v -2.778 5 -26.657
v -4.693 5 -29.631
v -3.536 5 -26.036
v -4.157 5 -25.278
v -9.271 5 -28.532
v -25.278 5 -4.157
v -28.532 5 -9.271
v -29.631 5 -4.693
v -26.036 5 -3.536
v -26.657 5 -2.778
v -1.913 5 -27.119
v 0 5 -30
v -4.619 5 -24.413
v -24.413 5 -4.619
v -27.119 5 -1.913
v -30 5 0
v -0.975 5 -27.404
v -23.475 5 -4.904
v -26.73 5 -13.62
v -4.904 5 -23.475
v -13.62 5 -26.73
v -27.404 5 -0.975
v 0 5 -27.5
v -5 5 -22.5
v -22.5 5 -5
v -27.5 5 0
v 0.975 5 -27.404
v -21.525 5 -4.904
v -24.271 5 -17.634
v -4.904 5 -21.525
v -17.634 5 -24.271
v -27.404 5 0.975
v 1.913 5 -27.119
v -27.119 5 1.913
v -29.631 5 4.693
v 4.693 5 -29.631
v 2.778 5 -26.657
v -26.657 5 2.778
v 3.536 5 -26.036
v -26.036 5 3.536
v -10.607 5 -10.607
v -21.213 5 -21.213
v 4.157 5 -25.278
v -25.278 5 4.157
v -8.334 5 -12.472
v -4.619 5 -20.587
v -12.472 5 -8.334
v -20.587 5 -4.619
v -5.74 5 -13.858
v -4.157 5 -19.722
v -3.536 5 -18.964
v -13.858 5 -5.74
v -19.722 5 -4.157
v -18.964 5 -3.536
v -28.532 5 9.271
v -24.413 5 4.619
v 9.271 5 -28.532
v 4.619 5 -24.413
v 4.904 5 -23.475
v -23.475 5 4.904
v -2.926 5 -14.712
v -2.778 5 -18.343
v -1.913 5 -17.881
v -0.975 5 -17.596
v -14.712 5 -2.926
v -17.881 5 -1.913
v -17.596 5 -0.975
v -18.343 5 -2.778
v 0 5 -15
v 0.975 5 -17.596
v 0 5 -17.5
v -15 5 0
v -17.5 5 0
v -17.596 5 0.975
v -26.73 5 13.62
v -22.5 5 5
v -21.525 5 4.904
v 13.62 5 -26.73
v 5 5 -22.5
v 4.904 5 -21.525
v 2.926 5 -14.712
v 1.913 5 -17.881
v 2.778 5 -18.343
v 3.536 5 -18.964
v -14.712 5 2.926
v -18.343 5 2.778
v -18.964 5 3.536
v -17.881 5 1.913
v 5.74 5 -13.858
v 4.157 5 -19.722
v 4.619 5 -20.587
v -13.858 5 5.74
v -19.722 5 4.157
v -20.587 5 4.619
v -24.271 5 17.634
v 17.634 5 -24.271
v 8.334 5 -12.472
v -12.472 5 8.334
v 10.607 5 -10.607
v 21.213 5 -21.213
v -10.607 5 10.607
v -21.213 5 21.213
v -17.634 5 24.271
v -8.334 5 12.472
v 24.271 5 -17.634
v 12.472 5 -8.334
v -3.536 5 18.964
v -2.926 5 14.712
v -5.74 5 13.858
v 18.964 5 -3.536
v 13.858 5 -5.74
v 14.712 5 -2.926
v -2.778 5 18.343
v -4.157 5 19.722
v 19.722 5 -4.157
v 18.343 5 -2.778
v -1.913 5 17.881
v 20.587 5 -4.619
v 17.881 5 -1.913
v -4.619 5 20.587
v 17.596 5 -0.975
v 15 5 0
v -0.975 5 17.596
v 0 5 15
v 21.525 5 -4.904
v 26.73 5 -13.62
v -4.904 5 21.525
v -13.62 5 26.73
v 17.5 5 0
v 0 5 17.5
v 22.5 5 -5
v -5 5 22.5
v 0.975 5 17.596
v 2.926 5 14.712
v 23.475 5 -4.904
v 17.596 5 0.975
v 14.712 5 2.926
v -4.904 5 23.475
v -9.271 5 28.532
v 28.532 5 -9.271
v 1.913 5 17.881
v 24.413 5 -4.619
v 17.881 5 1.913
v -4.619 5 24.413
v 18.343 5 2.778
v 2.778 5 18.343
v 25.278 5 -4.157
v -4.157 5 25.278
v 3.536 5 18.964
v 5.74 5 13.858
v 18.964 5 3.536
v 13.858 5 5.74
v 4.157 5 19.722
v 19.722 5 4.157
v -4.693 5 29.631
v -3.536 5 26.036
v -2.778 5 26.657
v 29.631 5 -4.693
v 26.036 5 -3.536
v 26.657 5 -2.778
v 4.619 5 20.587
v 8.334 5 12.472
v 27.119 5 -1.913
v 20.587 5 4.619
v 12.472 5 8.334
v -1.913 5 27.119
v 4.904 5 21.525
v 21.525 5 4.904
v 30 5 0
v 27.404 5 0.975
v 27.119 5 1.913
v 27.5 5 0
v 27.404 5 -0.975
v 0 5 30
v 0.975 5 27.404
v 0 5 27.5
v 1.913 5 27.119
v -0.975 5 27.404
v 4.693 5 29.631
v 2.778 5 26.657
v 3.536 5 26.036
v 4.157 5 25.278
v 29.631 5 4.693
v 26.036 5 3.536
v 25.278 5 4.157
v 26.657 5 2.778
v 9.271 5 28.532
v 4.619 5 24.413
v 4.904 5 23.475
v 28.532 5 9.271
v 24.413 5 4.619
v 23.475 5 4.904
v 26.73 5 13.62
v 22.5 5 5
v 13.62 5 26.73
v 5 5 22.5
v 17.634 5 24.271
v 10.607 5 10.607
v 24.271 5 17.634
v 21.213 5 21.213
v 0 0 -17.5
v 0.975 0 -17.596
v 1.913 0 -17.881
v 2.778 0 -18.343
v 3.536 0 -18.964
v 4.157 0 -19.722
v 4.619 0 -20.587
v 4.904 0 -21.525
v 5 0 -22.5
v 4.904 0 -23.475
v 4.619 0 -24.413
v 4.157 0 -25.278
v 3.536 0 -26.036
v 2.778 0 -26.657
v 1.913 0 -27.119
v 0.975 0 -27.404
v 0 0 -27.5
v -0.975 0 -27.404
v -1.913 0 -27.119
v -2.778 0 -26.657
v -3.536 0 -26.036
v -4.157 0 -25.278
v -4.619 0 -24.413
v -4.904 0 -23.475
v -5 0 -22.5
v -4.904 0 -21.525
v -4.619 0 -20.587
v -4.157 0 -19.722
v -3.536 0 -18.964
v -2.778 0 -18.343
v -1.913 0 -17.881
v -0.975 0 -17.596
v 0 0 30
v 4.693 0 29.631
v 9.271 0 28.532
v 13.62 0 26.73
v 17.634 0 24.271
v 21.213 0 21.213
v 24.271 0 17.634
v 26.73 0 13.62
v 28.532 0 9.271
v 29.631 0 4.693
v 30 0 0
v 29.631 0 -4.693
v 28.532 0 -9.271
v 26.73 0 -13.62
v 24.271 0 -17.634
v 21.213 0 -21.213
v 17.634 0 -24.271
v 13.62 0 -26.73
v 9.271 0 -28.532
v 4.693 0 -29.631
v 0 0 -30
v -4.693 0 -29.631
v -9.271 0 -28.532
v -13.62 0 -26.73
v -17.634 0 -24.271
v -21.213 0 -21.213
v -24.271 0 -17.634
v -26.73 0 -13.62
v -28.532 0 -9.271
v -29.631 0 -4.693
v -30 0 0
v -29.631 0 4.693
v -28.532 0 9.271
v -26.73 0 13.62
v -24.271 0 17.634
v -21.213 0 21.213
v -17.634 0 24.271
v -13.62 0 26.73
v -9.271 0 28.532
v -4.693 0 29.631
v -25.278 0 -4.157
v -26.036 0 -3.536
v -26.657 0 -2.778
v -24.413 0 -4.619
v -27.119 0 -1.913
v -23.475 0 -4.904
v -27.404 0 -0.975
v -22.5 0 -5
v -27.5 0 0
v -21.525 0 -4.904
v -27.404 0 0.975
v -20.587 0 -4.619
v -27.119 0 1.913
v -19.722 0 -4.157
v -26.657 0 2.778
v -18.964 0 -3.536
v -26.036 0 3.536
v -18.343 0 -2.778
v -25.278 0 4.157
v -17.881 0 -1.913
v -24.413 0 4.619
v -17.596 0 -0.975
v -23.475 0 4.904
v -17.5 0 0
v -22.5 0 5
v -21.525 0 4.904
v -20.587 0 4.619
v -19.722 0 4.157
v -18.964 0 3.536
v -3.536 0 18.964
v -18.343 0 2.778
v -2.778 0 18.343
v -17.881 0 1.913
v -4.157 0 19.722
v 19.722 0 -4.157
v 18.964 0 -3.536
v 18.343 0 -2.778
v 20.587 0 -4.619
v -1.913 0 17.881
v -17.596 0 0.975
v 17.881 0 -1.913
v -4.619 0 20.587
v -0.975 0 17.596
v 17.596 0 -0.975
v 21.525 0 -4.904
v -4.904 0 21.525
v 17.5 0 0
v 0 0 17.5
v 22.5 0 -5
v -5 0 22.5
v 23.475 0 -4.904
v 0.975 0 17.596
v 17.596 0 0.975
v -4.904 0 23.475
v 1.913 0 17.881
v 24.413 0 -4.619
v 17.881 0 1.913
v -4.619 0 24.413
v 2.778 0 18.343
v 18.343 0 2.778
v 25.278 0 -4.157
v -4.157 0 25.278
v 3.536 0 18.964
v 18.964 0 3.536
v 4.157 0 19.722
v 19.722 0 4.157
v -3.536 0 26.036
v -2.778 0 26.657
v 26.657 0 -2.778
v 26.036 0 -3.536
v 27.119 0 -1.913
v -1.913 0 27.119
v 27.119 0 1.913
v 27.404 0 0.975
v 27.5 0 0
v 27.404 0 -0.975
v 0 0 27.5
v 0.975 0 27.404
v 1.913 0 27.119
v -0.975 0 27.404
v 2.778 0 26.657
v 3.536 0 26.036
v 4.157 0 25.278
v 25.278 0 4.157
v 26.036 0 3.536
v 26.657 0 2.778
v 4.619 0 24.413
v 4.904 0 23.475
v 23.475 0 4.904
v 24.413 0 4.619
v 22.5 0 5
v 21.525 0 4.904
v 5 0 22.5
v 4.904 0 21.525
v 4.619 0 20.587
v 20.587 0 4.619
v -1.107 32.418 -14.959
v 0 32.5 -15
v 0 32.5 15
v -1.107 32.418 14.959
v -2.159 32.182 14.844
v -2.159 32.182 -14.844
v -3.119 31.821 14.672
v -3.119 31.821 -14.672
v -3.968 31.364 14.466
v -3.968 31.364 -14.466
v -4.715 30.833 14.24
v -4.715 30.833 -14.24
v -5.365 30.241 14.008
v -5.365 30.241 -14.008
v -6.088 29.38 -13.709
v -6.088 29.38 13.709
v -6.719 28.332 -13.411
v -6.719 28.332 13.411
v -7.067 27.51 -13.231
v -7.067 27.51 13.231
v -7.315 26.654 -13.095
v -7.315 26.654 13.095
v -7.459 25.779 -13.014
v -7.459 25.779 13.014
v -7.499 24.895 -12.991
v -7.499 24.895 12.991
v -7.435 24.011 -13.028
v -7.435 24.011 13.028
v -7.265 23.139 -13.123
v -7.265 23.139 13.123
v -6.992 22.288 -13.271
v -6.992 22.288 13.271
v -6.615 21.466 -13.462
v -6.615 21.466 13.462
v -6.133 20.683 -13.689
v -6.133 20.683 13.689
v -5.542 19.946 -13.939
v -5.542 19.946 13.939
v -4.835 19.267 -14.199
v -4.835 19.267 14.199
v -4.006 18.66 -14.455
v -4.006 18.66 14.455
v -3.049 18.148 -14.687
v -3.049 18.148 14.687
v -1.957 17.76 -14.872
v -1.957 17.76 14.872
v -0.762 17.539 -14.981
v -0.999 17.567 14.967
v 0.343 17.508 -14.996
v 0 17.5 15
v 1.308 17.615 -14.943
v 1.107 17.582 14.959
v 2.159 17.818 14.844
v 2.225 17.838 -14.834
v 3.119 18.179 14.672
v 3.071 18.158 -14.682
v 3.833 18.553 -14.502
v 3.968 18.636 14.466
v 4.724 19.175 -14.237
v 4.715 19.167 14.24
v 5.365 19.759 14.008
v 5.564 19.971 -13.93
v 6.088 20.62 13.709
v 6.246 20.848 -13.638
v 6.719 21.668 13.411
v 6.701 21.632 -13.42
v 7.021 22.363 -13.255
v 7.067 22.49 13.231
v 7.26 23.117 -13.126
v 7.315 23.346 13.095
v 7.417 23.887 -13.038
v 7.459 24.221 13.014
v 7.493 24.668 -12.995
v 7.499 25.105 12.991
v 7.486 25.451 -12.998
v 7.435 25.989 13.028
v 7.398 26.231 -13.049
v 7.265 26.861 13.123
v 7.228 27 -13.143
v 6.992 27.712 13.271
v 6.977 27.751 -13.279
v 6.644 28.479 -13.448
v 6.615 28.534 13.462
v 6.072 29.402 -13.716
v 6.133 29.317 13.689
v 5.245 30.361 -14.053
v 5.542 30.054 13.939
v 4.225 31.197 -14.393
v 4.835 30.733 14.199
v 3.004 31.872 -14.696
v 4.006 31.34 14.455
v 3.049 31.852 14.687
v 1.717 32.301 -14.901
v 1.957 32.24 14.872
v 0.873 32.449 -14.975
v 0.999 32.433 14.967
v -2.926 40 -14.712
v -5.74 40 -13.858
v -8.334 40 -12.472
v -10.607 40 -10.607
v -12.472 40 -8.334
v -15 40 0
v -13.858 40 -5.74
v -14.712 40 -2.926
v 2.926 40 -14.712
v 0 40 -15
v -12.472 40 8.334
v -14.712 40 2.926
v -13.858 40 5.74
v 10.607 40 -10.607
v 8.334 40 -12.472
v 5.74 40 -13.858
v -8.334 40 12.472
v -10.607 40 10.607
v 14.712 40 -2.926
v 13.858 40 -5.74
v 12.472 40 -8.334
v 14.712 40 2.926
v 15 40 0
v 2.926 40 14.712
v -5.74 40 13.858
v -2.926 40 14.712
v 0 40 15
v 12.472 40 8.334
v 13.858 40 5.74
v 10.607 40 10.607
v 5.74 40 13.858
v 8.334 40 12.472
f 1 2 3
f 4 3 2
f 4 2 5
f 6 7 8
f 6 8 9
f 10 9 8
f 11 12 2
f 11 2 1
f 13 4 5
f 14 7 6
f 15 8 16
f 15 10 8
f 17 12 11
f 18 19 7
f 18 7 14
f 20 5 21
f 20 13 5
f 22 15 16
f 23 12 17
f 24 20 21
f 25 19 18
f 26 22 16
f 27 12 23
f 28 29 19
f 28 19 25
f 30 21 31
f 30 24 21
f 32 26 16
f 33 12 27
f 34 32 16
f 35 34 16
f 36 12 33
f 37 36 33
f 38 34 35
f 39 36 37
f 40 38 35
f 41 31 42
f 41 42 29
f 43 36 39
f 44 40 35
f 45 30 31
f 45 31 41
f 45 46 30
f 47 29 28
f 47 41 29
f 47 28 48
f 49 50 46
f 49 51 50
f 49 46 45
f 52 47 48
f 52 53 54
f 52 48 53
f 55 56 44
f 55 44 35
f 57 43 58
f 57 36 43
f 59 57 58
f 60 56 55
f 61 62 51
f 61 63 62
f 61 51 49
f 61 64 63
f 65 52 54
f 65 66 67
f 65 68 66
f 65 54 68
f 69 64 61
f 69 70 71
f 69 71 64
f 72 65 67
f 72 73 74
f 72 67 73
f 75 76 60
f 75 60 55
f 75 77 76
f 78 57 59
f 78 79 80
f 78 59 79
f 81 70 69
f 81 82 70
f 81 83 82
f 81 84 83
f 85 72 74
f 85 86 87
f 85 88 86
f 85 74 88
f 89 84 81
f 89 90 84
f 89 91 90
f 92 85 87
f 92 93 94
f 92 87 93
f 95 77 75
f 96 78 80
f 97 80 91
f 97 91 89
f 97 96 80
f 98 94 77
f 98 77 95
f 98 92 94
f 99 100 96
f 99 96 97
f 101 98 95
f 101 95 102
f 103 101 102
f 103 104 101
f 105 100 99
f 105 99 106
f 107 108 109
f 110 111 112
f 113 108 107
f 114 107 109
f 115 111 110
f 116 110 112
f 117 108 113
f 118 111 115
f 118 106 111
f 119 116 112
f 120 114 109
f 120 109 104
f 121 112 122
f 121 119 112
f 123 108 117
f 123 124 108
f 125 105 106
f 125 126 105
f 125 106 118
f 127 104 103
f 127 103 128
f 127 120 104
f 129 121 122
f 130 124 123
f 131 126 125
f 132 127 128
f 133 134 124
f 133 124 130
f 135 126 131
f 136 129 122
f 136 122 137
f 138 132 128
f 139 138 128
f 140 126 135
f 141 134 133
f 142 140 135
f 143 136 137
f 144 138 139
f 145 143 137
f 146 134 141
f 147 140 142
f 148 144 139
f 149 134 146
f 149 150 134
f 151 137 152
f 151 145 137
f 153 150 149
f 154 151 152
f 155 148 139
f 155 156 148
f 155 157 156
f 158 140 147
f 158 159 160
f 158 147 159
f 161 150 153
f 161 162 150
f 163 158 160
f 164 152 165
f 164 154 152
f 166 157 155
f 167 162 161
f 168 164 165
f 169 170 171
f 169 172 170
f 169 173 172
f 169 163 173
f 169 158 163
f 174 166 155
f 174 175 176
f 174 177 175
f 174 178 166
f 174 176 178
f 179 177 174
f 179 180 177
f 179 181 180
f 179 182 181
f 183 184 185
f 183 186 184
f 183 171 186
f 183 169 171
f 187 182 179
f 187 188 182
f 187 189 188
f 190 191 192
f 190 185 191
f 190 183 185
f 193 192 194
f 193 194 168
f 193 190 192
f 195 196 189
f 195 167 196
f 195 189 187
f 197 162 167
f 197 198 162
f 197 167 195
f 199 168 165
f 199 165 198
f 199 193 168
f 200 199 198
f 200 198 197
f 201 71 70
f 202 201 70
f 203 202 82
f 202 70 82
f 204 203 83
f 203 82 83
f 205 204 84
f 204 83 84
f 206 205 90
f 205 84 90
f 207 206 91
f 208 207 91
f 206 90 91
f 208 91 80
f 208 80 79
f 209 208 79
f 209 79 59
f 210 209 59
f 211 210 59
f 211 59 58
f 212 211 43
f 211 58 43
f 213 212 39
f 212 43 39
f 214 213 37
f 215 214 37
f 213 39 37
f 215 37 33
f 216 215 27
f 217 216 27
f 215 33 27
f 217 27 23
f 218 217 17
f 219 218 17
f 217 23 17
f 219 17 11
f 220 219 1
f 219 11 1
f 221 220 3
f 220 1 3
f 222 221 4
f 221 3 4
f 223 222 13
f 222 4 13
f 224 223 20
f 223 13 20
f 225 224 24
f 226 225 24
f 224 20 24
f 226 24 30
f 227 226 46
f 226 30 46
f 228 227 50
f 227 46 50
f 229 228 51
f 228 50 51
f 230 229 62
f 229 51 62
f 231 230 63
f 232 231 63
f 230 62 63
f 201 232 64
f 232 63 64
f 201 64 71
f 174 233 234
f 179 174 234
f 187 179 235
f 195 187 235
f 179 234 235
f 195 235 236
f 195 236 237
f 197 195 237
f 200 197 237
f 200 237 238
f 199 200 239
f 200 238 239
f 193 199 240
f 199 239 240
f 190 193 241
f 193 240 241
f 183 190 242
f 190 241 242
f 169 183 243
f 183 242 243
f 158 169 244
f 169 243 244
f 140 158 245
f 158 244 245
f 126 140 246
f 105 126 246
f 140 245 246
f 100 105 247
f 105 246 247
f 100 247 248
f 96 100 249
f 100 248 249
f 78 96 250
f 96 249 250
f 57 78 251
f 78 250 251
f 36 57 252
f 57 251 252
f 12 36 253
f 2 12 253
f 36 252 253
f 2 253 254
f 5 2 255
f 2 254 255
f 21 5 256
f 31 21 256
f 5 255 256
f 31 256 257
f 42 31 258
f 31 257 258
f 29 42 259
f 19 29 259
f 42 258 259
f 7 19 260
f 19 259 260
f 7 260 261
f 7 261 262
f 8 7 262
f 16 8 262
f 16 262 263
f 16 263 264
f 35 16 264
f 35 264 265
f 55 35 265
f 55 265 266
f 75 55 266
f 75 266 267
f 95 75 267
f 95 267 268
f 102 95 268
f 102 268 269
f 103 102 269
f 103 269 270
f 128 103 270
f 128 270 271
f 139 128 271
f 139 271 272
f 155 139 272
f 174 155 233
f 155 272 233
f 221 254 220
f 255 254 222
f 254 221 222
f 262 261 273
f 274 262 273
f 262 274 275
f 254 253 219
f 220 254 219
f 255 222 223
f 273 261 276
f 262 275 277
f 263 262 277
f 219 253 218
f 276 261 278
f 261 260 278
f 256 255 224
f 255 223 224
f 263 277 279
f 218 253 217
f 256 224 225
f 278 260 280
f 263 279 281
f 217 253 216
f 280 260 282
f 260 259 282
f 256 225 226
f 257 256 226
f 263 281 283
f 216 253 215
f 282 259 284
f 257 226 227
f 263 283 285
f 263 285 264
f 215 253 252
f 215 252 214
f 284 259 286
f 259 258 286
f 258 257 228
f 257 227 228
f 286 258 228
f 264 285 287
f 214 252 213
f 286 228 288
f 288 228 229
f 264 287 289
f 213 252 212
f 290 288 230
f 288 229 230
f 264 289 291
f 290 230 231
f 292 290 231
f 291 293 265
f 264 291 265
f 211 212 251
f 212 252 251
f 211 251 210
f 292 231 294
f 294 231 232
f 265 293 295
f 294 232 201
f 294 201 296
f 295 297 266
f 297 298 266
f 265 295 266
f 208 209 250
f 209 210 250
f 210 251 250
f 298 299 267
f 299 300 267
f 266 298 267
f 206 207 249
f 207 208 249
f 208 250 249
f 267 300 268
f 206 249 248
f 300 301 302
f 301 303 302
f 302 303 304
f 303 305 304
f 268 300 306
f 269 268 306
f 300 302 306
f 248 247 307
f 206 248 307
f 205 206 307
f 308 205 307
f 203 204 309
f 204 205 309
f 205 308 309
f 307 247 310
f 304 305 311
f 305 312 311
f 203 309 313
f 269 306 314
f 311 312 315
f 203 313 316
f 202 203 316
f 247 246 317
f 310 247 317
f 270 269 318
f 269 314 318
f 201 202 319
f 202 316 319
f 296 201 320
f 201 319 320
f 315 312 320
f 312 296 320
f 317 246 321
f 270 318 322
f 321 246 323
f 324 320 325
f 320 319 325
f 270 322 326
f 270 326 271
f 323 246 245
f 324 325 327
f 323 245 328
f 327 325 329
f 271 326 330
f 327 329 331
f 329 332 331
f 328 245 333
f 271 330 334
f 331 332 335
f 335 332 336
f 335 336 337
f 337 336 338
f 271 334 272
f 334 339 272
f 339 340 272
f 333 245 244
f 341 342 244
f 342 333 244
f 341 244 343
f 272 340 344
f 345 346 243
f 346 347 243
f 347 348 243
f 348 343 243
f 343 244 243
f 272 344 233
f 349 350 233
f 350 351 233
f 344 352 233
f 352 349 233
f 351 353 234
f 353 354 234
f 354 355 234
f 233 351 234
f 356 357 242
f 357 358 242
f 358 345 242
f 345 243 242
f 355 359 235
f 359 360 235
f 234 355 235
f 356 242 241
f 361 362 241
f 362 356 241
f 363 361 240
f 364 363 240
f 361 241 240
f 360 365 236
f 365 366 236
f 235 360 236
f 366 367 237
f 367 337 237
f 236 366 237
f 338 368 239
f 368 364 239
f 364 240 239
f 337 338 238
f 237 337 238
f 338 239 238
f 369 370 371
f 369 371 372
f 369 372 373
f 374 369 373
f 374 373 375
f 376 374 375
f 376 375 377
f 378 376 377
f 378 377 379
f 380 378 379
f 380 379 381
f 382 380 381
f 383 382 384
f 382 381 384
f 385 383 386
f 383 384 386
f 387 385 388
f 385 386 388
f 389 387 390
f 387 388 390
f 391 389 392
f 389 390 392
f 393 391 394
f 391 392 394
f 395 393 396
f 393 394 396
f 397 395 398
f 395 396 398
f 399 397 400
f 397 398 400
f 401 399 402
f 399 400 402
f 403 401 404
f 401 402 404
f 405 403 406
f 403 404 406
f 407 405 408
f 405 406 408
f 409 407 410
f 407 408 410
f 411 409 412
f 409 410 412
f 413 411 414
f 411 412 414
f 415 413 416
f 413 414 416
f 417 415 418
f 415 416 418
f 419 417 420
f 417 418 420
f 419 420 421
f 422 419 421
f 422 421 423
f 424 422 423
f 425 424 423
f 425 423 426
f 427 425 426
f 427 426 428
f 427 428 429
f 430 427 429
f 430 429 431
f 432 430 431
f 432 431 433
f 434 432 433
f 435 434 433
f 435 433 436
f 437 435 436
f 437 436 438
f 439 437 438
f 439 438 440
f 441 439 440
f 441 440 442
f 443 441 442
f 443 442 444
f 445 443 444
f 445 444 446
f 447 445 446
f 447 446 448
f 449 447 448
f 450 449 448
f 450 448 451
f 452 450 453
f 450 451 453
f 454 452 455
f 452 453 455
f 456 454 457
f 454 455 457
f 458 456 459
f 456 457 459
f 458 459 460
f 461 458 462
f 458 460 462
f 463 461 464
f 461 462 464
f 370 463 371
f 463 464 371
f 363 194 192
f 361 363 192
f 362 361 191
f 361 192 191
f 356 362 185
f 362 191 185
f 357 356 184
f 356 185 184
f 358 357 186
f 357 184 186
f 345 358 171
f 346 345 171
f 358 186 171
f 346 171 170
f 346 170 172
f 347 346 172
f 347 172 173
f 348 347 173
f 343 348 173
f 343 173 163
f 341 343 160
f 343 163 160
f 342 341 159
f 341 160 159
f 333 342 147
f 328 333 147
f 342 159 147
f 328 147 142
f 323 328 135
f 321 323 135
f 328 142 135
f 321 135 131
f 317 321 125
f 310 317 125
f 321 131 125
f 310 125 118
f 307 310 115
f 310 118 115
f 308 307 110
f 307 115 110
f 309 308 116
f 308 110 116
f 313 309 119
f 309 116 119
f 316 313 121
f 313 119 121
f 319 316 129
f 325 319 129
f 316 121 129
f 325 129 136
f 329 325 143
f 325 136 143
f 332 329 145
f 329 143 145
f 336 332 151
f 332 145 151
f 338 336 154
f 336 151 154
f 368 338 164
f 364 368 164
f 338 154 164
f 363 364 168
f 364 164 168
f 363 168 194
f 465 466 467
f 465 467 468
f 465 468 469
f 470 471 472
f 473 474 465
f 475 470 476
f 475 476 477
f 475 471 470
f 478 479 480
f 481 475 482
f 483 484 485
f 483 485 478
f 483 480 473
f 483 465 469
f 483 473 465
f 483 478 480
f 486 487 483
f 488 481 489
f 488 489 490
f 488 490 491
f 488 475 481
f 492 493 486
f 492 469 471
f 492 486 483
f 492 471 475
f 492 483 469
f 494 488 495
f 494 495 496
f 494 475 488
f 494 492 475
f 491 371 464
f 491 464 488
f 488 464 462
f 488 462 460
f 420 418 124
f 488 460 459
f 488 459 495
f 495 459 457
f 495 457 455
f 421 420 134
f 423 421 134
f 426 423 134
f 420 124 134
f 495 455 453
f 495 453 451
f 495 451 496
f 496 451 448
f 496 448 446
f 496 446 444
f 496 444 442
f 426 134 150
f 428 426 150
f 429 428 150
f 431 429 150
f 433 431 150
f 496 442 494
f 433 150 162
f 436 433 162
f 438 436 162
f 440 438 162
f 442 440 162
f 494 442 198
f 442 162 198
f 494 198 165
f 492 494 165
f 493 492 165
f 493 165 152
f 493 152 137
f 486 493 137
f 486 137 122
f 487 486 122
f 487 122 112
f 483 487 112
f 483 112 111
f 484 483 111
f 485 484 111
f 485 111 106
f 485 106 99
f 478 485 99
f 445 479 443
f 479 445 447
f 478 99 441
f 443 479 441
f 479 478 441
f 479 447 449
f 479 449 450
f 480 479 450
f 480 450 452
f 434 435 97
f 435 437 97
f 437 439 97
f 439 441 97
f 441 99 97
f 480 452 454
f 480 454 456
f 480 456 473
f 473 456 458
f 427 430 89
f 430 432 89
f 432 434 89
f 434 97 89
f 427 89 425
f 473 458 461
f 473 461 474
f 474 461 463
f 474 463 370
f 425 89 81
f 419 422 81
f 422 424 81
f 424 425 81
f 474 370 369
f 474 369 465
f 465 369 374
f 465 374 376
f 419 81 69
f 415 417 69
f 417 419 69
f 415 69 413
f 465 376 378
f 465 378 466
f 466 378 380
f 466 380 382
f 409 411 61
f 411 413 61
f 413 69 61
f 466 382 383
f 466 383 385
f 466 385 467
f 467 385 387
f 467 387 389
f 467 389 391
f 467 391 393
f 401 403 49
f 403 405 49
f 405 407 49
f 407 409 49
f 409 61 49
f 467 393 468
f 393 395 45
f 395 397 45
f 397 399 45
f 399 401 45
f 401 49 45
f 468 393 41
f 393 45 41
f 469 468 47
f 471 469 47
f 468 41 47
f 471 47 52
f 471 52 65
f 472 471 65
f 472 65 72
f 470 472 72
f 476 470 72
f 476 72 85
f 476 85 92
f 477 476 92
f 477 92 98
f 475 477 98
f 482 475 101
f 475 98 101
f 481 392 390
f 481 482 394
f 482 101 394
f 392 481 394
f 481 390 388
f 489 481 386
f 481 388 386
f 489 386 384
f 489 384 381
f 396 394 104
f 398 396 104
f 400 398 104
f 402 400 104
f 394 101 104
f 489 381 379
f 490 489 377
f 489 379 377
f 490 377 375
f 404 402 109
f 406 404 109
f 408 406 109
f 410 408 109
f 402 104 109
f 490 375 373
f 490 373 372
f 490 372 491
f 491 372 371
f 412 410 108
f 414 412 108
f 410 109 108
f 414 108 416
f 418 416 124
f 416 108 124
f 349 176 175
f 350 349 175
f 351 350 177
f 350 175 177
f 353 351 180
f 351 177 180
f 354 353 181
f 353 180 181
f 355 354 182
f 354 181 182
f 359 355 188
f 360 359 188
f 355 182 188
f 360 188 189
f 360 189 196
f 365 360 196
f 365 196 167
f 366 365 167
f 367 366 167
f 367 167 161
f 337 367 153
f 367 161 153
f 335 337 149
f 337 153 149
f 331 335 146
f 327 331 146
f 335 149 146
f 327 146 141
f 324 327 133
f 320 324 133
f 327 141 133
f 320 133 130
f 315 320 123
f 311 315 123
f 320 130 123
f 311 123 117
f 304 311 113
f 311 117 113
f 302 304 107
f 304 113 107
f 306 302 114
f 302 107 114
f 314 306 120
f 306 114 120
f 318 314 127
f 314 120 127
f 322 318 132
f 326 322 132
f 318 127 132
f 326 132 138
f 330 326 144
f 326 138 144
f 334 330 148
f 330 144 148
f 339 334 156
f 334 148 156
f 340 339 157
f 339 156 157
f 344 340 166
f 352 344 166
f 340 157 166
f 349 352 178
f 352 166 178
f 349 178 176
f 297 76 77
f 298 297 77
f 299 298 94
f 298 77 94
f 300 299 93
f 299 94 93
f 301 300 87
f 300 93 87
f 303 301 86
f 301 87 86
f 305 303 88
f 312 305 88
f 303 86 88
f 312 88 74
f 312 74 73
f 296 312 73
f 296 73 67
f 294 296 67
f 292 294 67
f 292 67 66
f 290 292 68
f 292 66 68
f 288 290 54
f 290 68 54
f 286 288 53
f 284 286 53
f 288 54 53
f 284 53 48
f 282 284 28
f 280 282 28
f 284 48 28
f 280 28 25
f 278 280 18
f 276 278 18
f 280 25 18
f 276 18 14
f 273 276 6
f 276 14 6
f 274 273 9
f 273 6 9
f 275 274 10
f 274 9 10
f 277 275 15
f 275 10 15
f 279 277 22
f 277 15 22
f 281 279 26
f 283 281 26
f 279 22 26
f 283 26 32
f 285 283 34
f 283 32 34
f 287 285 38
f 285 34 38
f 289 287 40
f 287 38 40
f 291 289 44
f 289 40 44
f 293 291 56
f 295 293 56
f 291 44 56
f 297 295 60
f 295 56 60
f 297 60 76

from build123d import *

# Parameters (mm, degrees)
SKETCH1_R           = 30
BOSS_EXTRUDE1_DEPTH = 5
SKETCH2_R           = 5
CUT_EXTRUDE1_DEPTH  = 5
SKETCH3_R           = 15
BOSS_EXTRUDE2_DEPTH = 35
SKETCH4_R           = 7.5
CUT_EXTRUDE2_DEPTH  = 68.268120235


with BuildPart() as part:
    # Sketch1 → Boss-Extrude1 (new body)
    with BuildSketch(Plane(origin=(0, 0, 0), x_dir=(1, 0, 0), z_dir=(0, 1, 0))):
        with Locations(Location((0, 0, 0), (0, 0, 270))):
            Circle(SKETCH1_R)
    extrude(amount=BOSS_EXTRUDE1_DEPTH)

    # Sketch2 → Cut-Extrude1 (cut)
    with BuildSketch(Plane(origin=(0, 5, 0), x_dir=(1, 0, 0), z_dir=(0, 1, 0))):
        with Locations(Location((0, 22.5, 0), (0, 0, 270))):
            Circle(SKETCH2_R)
        with Locations(Location((22.5, 0, 0), (0, 0, 270))):
            Circle(SKETCH2_R)
        with Locations(Location((0, -22.5, 0), (0, 0, 270))):
            Circle(SKETCH2_R)
        with Locations(Location((-22.5, 0, 0), (0, 0, 270))):
            Circle(SKETCH2_R)
    extrude(amount=-CUT_EXTRUDE1_DEPTH, mode=Mode.SUBTRACT)

    # Sketch3 → Boss-Extrude2 (add)
    with BuildSketch(Plane(origin=(0, 5, 0), x_dir=(1, 0, 0), z_dir=(0, 1, 0))):
        with Locations(Location((0, 0, 0), (0, 0, 270))):
            Circle(SKETCH3_R)
    extrude(amount=BOSS_EXTRUDE2_DEPTH)

    # Sketch4 → Cut-Extrude2 (cut, through all)
    with BuildSketch(Plane.XY.offset(15)):
        with Locations(Location((0, 25, 0), (0, 0, 90.000000014))):
            Circle(SKETCH4_R)
    extrude(amount=-CUT_EXTRUDE2_DEPTH, mode=Mode.SUBTRACT)


solid = part.part
